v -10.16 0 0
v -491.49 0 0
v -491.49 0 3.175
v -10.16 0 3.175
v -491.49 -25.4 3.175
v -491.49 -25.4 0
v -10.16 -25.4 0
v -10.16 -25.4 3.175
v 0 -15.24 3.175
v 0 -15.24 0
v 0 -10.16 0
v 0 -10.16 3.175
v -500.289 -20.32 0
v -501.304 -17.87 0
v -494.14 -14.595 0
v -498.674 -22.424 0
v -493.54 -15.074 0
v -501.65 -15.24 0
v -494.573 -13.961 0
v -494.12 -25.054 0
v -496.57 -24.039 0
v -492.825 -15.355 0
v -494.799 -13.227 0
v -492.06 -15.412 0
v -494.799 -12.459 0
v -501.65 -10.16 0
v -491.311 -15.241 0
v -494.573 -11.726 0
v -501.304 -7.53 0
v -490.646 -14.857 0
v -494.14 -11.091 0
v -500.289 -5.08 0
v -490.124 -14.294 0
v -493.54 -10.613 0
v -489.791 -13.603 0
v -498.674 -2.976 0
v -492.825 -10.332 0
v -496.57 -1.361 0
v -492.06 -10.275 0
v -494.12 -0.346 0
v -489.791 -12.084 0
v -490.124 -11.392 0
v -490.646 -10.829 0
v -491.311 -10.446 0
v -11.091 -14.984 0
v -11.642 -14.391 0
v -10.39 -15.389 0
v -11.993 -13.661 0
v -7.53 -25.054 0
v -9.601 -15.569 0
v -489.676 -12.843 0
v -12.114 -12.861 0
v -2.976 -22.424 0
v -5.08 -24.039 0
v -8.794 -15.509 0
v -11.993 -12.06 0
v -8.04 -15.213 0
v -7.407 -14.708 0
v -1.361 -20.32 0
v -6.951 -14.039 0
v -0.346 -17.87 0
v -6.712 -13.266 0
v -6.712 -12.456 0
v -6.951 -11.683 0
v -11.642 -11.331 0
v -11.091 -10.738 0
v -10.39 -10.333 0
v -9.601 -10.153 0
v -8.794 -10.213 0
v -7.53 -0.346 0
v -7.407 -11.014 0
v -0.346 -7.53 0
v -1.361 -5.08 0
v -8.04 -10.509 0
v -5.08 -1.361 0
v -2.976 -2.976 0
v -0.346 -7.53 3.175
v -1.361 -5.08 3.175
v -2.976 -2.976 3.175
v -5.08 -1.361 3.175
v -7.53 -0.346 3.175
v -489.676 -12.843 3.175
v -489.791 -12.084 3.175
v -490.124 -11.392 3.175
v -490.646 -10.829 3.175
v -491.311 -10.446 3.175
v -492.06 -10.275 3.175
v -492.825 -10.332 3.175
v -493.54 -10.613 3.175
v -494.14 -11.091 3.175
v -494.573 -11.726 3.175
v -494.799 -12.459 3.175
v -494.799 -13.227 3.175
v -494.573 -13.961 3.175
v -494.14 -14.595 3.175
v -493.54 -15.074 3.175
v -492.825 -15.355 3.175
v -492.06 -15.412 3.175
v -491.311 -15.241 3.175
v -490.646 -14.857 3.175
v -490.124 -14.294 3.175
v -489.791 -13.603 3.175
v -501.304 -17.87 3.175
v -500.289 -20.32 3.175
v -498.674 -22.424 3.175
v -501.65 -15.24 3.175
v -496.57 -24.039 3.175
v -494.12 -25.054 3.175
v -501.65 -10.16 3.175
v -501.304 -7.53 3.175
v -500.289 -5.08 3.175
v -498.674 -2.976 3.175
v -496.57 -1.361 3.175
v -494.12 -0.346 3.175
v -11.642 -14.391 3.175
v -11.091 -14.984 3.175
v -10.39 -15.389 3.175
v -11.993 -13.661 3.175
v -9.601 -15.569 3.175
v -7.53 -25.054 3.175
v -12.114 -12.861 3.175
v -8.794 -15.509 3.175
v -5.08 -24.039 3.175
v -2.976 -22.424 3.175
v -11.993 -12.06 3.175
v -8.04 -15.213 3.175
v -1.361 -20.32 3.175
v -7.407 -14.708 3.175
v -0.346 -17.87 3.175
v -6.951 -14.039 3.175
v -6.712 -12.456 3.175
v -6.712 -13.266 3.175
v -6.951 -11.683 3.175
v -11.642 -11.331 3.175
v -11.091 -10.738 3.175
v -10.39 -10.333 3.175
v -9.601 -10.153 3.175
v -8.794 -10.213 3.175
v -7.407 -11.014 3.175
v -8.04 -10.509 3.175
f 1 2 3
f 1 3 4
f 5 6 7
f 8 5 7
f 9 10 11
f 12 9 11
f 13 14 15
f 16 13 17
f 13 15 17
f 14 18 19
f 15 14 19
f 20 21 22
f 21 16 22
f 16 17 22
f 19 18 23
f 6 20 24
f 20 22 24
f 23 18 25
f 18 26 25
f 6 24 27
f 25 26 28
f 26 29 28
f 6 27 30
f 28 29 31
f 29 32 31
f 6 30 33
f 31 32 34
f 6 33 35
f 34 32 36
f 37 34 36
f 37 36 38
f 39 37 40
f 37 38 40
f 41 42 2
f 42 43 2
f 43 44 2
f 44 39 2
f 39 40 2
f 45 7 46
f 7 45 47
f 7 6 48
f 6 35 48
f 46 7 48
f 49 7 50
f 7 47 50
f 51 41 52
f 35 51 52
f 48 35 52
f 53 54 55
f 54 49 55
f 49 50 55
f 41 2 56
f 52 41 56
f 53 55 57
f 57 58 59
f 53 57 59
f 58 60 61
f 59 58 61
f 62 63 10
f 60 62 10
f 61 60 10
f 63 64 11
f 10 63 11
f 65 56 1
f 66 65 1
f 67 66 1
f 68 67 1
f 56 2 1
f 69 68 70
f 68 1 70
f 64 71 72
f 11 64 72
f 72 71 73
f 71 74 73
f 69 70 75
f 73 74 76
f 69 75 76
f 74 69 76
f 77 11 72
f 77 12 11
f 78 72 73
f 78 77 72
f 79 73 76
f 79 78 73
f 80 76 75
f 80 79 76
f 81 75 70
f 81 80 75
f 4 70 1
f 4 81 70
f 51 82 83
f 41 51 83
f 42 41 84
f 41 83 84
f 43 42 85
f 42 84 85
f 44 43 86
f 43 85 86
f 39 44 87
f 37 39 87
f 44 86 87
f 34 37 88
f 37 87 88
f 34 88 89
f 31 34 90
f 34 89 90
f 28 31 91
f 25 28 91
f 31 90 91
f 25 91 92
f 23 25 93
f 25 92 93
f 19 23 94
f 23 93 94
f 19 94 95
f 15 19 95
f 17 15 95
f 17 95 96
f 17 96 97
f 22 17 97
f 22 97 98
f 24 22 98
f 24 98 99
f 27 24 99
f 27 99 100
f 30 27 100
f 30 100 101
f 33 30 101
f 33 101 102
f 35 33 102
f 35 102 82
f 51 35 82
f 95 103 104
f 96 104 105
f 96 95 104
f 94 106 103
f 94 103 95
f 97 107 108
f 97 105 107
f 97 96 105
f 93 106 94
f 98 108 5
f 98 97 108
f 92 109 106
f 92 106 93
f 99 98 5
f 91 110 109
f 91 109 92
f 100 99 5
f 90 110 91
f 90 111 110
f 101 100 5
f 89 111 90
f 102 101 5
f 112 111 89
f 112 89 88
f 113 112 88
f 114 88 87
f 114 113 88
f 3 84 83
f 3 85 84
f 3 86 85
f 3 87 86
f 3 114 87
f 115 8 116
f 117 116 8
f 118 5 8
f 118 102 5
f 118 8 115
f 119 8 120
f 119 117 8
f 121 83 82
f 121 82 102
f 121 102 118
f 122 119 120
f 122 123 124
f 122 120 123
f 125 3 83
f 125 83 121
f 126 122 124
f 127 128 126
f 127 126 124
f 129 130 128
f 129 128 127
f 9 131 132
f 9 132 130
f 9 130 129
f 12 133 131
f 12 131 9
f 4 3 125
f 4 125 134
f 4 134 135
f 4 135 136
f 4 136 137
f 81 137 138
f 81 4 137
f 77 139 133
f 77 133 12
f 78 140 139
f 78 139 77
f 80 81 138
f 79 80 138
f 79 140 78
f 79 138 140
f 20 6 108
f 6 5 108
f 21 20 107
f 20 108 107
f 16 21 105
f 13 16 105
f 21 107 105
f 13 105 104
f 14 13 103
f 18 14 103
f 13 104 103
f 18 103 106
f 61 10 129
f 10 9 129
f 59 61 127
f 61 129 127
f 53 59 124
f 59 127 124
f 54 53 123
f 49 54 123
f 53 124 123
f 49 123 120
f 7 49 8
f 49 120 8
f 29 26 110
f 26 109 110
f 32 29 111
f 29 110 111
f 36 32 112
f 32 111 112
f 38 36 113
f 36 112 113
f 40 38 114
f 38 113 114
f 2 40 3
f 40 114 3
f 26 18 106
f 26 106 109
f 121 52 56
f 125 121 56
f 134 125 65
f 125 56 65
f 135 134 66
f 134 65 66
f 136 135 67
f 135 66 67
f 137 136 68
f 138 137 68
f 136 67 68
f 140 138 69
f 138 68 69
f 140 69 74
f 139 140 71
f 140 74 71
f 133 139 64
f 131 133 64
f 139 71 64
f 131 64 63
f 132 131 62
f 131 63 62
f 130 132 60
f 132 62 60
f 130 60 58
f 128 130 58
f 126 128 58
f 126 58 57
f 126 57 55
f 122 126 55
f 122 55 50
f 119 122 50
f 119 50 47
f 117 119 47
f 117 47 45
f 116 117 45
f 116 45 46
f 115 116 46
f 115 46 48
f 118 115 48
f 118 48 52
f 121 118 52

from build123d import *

# Parameters (mm, degrees)
SKETCH1_W           = 501.65
SKETCH1_H           = 25.4
BOSS_EXTRUDE1_DEPTH = 3.175
FILLET1_R           = 10.16
FILLET2_R           = 10.16
FILLET3_R           = 10.16
FILLET4_R           = 10.16
SKETCH2_R           = 2.575820617
CUT_EXTRUDE1_DEPTH  = 503.302660878
SKETCH3_R           = 2.715891218
CUT_EXTRUDE2_DEPTH  = 503.302660878


with BuildPart() as part:
    # Sketch1 → Boss-Extrude1 (new body)
    with BuildSketch(Plane.XY):
        with Locations((-250.825, -12.7)):
            Rectangle(SKETCH1_W, SKETCH1_H)
    extrude(amount=BOSS_EXTRUDE1_DEPTH)

    # Fillet1
    fillet1_edges = [part.edges().sort_by_distance(p)[0] for p in [
        (0, 0, 1.5875),
    ]]
    fillet(fillet1_edges, radius=FILLET1_R)

    # Fillet2
    fillet2_edges = [part.edges().sort_by_distance(p)[0] for p in [
        (0, -25.4, 1.5875),
    ]]
    fillet(fillet2_edges, radius=FILLET2_R)

    # Fillet3
    fillet3_edges = [part.edges().sort_by_distance(p)[0] for p in [
        (-501.65, -25.4, 1.5875),
    ]]
    fillet(fillet3_edges, radius=FILLET3_R)

    # Fillet4
    fillet4_edges = [part.edges().sort_by_distance(p)[0] for p in [
        (-501.65, 0, 1.5875),
    ]]
    fillet(fillet4_edges, radius=FILLET4_R)

    # Sketch2 → Cut-Extrude1 (cut, through all)
    with BuildSketch(Plane.XY.offset(3.175)):
        with Locations((-492.252, -12.843347419)):
            Circle(SKETCH2_R)
    extrude(amount=-CUT_EXTRUDE1_DEPTH, mode=Mode.SUBTRACT)

    # Sketch3 → Cut-Extrude2 (cut, through all)
    with BuildSketch(Plane(origin=(0, 0, 0), x_dir=(-1, 0, 0), z_dir=(0, 0, -1))):
        with Locations((9.398, -12.860909178)):
            Circle(SKETCH3_R)
    extrude(amount=-CUT_EXTRUDE2_DEPTH, mode=Mode.SUBTRACT)


solid = part.part
